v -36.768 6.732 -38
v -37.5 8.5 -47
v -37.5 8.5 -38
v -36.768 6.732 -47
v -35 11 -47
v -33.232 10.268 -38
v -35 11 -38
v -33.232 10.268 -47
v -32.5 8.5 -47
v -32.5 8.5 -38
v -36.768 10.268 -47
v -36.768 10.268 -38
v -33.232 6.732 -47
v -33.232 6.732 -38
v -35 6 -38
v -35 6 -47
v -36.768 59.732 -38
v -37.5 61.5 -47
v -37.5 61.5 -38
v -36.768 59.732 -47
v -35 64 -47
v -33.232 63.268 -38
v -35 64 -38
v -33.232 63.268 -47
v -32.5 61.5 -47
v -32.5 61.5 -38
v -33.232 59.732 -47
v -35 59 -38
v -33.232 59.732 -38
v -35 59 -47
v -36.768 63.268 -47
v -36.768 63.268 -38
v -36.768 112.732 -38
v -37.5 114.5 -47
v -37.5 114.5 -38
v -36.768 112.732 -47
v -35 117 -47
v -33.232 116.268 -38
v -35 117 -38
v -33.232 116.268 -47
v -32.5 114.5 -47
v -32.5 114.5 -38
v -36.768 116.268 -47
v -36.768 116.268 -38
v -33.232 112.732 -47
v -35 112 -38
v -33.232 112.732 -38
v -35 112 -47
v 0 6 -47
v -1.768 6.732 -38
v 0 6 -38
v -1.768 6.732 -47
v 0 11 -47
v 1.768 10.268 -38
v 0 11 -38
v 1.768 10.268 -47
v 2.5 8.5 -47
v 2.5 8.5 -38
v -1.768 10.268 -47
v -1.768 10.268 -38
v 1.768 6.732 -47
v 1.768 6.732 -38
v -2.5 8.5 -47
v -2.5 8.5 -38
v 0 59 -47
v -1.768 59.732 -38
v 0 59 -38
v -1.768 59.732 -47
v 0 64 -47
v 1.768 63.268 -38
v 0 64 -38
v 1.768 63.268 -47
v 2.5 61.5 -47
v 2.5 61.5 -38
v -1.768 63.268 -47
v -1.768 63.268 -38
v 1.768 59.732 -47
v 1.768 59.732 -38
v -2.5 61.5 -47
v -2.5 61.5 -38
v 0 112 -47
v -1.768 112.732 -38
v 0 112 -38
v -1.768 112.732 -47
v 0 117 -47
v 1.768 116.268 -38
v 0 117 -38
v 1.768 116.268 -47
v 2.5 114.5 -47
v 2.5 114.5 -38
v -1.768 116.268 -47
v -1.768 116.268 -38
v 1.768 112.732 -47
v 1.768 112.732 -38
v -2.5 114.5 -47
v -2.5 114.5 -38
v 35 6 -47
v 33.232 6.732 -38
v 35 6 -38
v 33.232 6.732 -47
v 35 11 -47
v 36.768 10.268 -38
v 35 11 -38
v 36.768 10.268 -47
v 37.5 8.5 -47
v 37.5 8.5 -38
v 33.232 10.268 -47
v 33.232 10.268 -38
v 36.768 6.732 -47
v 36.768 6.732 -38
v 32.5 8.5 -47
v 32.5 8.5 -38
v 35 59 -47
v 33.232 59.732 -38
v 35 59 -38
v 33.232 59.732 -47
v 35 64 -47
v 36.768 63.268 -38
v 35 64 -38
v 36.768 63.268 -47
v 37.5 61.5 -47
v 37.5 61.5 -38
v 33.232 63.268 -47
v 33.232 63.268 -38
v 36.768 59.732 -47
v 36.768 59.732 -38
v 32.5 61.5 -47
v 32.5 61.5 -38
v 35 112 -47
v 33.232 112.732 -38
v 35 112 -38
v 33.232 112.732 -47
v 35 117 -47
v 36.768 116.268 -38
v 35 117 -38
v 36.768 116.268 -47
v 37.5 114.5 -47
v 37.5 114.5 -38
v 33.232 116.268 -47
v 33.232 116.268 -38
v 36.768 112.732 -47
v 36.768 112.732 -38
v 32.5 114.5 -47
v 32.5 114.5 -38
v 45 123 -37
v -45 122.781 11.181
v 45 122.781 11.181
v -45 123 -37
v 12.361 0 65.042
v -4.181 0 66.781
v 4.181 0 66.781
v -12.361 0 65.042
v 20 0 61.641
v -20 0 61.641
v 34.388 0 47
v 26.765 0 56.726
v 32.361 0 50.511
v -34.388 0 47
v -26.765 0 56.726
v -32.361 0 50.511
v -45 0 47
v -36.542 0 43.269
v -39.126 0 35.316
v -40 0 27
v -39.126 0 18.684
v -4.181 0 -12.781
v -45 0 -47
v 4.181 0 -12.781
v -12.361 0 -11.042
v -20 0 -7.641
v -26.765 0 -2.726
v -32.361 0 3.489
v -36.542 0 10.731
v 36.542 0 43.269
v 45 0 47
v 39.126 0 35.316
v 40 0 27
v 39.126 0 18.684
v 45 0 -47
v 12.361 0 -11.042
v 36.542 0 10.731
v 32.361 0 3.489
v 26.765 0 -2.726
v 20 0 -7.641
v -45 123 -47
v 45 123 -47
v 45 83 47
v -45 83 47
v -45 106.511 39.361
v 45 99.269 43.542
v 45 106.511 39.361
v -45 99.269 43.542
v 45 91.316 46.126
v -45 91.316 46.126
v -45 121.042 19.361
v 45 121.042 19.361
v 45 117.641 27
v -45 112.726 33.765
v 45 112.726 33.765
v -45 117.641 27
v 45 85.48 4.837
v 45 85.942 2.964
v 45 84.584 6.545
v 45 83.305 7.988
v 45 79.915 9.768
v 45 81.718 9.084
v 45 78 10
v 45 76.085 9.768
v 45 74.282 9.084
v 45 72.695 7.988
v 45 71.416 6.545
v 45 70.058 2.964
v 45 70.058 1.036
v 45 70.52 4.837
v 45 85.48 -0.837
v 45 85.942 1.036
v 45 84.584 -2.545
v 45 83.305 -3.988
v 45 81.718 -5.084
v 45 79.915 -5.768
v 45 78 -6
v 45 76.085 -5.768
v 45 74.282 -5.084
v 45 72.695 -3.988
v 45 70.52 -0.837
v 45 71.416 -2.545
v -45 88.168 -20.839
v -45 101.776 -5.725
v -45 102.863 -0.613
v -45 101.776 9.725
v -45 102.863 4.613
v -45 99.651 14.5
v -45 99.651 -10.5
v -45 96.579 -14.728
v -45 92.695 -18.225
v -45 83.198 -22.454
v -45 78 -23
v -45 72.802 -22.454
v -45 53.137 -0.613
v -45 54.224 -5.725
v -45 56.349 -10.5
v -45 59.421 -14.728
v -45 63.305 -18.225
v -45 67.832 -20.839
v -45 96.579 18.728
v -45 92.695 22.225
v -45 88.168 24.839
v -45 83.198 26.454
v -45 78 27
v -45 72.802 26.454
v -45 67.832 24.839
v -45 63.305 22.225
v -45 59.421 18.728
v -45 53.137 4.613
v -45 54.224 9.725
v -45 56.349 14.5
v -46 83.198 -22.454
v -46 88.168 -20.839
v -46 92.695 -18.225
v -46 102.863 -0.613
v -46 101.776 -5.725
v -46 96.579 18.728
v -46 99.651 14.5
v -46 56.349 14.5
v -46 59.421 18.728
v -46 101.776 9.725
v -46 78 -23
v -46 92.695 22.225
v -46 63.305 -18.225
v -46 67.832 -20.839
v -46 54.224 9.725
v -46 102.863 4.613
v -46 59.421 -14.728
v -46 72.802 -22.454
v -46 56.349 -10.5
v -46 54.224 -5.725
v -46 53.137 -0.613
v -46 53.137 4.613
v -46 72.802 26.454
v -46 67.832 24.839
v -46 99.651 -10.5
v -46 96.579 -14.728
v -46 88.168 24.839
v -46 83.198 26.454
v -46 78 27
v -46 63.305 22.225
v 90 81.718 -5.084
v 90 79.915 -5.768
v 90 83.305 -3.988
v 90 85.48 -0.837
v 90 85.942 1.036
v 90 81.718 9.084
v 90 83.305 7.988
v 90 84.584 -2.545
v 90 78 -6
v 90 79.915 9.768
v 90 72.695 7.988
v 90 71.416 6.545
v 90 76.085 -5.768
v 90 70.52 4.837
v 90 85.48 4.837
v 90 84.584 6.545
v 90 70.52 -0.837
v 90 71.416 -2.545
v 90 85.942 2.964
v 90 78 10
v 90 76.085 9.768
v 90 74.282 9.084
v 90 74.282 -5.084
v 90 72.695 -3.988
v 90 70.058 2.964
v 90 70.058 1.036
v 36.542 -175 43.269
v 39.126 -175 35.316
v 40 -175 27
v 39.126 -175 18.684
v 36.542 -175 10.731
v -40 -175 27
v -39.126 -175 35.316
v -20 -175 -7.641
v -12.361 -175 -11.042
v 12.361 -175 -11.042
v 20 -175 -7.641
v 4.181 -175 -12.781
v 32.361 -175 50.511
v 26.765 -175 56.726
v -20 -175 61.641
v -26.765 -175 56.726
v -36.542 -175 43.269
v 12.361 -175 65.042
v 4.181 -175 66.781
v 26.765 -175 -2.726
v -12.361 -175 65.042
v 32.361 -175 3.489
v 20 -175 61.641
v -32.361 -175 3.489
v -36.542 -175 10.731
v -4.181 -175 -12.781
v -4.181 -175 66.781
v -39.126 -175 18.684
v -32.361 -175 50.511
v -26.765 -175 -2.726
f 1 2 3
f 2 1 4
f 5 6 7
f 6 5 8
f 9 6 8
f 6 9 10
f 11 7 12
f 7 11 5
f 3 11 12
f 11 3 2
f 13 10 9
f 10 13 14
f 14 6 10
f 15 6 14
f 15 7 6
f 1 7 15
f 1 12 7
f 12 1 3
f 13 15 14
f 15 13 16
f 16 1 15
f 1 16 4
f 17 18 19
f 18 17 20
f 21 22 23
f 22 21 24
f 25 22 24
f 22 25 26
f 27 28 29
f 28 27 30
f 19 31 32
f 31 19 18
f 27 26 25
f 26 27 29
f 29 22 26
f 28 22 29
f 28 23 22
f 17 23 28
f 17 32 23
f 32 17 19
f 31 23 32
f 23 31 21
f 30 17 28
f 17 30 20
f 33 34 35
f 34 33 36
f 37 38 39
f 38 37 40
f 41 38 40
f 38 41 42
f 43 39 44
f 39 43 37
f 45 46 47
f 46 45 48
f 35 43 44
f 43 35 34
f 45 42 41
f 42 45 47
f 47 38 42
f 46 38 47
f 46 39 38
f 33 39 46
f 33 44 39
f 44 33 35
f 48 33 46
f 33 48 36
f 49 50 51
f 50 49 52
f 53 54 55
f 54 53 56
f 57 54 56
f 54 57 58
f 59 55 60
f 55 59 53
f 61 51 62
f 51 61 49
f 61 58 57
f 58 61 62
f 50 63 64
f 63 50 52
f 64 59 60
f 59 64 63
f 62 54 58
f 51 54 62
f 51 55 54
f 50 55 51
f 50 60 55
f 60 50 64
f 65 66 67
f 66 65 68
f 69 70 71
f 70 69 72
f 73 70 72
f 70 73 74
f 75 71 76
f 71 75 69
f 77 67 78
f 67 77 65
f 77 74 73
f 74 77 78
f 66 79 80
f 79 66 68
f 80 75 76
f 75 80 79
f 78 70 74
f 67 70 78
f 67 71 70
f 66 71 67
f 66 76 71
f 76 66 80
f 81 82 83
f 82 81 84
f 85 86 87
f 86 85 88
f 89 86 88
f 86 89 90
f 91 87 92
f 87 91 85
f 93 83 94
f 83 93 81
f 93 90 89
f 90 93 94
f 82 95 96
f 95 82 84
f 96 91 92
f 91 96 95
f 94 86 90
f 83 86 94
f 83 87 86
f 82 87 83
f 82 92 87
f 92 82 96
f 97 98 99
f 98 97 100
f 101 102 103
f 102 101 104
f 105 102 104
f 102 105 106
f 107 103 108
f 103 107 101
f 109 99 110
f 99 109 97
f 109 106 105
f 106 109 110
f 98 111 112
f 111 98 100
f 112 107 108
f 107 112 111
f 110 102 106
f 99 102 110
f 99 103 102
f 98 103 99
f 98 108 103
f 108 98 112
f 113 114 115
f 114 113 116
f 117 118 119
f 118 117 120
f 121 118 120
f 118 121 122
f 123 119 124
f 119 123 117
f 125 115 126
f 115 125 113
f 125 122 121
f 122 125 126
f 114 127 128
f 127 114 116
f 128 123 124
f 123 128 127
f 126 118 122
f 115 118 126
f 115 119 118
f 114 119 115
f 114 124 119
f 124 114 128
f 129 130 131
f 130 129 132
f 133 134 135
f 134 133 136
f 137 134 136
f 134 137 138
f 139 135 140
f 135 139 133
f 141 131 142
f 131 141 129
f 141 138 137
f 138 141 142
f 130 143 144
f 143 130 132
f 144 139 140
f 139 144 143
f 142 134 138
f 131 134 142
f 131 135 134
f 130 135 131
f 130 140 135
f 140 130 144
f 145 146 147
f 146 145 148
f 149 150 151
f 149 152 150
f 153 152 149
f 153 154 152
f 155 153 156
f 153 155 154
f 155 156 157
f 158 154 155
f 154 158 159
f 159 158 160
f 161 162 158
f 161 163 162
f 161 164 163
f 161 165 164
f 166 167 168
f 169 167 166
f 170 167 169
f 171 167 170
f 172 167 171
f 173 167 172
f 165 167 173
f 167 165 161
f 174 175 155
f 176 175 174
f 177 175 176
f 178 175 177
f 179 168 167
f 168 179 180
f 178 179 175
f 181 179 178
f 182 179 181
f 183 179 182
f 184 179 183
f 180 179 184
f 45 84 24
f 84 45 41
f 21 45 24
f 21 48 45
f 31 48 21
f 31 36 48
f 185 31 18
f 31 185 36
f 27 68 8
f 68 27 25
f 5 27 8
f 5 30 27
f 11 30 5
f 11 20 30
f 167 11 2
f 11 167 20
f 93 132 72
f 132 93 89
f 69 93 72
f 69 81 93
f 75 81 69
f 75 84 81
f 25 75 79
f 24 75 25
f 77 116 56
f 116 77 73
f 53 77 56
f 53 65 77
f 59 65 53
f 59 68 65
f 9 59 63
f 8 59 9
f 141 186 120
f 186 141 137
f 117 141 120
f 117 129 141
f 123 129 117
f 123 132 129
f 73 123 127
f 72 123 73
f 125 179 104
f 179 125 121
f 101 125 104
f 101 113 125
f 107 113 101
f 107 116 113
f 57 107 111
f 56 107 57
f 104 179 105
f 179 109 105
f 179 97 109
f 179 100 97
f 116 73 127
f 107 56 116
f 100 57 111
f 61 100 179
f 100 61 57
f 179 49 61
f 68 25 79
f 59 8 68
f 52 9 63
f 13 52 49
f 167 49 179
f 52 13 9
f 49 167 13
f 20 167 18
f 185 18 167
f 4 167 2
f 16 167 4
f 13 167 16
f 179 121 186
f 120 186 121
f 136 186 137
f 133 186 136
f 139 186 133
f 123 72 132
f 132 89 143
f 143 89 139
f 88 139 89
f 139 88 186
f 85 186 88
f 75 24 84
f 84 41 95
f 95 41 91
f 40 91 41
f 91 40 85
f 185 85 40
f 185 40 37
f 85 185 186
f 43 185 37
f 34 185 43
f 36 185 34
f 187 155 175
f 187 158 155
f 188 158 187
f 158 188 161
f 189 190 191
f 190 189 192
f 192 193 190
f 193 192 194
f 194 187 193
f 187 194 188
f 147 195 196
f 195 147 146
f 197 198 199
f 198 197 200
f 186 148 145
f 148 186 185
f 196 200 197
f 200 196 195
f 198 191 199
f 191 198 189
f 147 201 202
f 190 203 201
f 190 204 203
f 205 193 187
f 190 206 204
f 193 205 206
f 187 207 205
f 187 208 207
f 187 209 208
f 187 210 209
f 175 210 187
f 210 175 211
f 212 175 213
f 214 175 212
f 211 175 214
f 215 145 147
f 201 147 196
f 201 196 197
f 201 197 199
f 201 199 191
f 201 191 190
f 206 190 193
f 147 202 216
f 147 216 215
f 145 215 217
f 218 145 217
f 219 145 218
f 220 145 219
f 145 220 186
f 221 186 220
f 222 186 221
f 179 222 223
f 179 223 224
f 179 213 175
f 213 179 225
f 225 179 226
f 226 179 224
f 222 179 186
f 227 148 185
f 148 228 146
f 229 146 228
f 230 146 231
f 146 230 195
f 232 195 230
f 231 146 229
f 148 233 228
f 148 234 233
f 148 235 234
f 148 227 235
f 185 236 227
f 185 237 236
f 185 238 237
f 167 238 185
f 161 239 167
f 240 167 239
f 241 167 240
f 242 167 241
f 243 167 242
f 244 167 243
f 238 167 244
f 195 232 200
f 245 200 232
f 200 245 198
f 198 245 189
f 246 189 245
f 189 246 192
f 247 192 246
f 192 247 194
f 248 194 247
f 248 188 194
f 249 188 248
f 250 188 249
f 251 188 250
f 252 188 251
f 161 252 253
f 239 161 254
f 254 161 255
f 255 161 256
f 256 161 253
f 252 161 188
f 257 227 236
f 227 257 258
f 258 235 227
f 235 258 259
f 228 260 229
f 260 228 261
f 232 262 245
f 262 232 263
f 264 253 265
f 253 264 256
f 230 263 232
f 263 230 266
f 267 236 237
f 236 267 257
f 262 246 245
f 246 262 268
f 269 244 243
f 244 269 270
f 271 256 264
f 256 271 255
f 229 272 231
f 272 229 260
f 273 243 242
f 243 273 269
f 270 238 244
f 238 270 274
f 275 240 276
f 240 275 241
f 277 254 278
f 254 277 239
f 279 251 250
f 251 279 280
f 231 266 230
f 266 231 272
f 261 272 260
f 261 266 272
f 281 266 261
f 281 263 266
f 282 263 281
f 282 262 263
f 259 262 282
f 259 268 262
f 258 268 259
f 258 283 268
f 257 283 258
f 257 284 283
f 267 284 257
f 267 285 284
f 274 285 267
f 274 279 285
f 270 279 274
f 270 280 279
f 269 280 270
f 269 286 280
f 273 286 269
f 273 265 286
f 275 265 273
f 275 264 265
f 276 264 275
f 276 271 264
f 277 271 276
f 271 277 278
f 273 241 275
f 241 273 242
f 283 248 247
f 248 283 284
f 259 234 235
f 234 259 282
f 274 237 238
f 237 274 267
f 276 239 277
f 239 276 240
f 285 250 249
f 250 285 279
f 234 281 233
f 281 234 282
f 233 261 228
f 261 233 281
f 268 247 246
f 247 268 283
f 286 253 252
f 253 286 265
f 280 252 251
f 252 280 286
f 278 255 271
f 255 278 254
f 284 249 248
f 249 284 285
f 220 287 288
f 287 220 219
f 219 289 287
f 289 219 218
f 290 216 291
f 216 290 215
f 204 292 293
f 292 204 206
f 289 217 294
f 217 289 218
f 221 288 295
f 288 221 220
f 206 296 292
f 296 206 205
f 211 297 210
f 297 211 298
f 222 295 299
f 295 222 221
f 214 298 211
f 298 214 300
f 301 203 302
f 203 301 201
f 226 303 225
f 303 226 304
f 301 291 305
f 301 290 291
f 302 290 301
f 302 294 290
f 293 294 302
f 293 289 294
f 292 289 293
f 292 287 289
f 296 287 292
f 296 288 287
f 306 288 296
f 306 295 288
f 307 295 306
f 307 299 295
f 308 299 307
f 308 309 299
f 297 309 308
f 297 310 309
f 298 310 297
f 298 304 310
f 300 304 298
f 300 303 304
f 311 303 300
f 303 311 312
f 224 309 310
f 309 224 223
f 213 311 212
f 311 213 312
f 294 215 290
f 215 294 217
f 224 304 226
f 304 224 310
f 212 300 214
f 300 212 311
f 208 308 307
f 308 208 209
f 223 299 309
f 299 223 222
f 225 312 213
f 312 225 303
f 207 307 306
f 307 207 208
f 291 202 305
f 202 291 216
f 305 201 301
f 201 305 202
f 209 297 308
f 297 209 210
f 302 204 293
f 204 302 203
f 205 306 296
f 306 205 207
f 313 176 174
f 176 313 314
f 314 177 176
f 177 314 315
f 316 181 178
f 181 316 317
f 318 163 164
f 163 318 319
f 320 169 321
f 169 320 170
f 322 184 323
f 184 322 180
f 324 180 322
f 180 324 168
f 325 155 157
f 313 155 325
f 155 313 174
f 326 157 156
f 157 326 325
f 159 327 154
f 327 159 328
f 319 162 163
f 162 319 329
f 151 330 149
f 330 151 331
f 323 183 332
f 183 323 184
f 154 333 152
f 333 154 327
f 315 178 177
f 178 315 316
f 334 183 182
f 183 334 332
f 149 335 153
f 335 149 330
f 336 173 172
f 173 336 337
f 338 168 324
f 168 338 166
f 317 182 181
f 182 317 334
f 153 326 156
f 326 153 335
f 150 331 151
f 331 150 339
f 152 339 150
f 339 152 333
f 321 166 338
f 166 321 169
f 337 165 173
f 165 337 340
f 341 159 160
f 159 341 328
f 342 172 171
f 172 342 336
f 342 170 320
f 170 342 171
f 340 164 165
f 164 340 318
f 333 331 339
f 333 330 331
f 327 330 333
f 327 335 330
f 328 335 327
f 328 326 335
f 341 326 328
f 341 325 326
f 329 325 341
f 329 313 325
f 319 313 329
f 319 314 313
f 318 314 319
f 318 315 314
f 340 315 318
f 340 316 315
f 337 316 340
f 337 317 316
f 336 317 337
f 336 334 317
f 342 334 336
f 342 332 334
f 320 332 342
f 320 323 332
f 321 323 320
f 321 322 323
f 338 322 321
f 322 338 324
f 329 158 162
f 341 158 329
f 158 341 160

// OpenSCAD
module motor(dir="left")
{
	translate([0,-175/2,(-(94-80)/2)+34])rotate([90,0,0])color([0.3,0.3,0.3])cylinder(r=80/2, h=175, center=true);

	difference()
	{
		color("silver") hull()
		{
			translate([0,21.5+61.5,7]) rotate([0,90,0]) cylinder(r=80/2, h=90, center=true);
			translate([0,-56.5+61.5,42]) cube([90, 10, 10],center=true);
			translate([0,-56.5+61.5,-42]) cube([90, 10, 10],center=true);
			translate([0,56.5+61.5,-42]) cube([90, 10, 10],center=true);
		}
		
		for (x=[-35, 0, 35])
			for (y=[-53, 0, 53])
				translate([x,61.5+y,-43]) cylinder(r=5/2, h=10, center=true);
	}
	if (dir=="left")
	{
		color ("black") translate([1,16.5+61.5,2]) rotate([0,90,0]) cylinder(r=50/2, h=90, center=true);
		color ("grey") translate([-45,16.5+61.5,2]) rotate([0,90,0]) cylinder(r=16/2, h=90, center=true);
	}
	else
	{
		color ("black") translate([-1,16.5+61.5,2]) rotate([0,90,0]) cylinder(r=50/2, h=90, center=true);
		color ("grey") translate([45,16.5+61.5,2]) rotate([0,90,0]) cylinder(r=16/2, h=90, center=true);
	}
}

module motor_l()
{
	motor("left");
}

module motor_r()
{
	motor("right");
}

motor_r();
